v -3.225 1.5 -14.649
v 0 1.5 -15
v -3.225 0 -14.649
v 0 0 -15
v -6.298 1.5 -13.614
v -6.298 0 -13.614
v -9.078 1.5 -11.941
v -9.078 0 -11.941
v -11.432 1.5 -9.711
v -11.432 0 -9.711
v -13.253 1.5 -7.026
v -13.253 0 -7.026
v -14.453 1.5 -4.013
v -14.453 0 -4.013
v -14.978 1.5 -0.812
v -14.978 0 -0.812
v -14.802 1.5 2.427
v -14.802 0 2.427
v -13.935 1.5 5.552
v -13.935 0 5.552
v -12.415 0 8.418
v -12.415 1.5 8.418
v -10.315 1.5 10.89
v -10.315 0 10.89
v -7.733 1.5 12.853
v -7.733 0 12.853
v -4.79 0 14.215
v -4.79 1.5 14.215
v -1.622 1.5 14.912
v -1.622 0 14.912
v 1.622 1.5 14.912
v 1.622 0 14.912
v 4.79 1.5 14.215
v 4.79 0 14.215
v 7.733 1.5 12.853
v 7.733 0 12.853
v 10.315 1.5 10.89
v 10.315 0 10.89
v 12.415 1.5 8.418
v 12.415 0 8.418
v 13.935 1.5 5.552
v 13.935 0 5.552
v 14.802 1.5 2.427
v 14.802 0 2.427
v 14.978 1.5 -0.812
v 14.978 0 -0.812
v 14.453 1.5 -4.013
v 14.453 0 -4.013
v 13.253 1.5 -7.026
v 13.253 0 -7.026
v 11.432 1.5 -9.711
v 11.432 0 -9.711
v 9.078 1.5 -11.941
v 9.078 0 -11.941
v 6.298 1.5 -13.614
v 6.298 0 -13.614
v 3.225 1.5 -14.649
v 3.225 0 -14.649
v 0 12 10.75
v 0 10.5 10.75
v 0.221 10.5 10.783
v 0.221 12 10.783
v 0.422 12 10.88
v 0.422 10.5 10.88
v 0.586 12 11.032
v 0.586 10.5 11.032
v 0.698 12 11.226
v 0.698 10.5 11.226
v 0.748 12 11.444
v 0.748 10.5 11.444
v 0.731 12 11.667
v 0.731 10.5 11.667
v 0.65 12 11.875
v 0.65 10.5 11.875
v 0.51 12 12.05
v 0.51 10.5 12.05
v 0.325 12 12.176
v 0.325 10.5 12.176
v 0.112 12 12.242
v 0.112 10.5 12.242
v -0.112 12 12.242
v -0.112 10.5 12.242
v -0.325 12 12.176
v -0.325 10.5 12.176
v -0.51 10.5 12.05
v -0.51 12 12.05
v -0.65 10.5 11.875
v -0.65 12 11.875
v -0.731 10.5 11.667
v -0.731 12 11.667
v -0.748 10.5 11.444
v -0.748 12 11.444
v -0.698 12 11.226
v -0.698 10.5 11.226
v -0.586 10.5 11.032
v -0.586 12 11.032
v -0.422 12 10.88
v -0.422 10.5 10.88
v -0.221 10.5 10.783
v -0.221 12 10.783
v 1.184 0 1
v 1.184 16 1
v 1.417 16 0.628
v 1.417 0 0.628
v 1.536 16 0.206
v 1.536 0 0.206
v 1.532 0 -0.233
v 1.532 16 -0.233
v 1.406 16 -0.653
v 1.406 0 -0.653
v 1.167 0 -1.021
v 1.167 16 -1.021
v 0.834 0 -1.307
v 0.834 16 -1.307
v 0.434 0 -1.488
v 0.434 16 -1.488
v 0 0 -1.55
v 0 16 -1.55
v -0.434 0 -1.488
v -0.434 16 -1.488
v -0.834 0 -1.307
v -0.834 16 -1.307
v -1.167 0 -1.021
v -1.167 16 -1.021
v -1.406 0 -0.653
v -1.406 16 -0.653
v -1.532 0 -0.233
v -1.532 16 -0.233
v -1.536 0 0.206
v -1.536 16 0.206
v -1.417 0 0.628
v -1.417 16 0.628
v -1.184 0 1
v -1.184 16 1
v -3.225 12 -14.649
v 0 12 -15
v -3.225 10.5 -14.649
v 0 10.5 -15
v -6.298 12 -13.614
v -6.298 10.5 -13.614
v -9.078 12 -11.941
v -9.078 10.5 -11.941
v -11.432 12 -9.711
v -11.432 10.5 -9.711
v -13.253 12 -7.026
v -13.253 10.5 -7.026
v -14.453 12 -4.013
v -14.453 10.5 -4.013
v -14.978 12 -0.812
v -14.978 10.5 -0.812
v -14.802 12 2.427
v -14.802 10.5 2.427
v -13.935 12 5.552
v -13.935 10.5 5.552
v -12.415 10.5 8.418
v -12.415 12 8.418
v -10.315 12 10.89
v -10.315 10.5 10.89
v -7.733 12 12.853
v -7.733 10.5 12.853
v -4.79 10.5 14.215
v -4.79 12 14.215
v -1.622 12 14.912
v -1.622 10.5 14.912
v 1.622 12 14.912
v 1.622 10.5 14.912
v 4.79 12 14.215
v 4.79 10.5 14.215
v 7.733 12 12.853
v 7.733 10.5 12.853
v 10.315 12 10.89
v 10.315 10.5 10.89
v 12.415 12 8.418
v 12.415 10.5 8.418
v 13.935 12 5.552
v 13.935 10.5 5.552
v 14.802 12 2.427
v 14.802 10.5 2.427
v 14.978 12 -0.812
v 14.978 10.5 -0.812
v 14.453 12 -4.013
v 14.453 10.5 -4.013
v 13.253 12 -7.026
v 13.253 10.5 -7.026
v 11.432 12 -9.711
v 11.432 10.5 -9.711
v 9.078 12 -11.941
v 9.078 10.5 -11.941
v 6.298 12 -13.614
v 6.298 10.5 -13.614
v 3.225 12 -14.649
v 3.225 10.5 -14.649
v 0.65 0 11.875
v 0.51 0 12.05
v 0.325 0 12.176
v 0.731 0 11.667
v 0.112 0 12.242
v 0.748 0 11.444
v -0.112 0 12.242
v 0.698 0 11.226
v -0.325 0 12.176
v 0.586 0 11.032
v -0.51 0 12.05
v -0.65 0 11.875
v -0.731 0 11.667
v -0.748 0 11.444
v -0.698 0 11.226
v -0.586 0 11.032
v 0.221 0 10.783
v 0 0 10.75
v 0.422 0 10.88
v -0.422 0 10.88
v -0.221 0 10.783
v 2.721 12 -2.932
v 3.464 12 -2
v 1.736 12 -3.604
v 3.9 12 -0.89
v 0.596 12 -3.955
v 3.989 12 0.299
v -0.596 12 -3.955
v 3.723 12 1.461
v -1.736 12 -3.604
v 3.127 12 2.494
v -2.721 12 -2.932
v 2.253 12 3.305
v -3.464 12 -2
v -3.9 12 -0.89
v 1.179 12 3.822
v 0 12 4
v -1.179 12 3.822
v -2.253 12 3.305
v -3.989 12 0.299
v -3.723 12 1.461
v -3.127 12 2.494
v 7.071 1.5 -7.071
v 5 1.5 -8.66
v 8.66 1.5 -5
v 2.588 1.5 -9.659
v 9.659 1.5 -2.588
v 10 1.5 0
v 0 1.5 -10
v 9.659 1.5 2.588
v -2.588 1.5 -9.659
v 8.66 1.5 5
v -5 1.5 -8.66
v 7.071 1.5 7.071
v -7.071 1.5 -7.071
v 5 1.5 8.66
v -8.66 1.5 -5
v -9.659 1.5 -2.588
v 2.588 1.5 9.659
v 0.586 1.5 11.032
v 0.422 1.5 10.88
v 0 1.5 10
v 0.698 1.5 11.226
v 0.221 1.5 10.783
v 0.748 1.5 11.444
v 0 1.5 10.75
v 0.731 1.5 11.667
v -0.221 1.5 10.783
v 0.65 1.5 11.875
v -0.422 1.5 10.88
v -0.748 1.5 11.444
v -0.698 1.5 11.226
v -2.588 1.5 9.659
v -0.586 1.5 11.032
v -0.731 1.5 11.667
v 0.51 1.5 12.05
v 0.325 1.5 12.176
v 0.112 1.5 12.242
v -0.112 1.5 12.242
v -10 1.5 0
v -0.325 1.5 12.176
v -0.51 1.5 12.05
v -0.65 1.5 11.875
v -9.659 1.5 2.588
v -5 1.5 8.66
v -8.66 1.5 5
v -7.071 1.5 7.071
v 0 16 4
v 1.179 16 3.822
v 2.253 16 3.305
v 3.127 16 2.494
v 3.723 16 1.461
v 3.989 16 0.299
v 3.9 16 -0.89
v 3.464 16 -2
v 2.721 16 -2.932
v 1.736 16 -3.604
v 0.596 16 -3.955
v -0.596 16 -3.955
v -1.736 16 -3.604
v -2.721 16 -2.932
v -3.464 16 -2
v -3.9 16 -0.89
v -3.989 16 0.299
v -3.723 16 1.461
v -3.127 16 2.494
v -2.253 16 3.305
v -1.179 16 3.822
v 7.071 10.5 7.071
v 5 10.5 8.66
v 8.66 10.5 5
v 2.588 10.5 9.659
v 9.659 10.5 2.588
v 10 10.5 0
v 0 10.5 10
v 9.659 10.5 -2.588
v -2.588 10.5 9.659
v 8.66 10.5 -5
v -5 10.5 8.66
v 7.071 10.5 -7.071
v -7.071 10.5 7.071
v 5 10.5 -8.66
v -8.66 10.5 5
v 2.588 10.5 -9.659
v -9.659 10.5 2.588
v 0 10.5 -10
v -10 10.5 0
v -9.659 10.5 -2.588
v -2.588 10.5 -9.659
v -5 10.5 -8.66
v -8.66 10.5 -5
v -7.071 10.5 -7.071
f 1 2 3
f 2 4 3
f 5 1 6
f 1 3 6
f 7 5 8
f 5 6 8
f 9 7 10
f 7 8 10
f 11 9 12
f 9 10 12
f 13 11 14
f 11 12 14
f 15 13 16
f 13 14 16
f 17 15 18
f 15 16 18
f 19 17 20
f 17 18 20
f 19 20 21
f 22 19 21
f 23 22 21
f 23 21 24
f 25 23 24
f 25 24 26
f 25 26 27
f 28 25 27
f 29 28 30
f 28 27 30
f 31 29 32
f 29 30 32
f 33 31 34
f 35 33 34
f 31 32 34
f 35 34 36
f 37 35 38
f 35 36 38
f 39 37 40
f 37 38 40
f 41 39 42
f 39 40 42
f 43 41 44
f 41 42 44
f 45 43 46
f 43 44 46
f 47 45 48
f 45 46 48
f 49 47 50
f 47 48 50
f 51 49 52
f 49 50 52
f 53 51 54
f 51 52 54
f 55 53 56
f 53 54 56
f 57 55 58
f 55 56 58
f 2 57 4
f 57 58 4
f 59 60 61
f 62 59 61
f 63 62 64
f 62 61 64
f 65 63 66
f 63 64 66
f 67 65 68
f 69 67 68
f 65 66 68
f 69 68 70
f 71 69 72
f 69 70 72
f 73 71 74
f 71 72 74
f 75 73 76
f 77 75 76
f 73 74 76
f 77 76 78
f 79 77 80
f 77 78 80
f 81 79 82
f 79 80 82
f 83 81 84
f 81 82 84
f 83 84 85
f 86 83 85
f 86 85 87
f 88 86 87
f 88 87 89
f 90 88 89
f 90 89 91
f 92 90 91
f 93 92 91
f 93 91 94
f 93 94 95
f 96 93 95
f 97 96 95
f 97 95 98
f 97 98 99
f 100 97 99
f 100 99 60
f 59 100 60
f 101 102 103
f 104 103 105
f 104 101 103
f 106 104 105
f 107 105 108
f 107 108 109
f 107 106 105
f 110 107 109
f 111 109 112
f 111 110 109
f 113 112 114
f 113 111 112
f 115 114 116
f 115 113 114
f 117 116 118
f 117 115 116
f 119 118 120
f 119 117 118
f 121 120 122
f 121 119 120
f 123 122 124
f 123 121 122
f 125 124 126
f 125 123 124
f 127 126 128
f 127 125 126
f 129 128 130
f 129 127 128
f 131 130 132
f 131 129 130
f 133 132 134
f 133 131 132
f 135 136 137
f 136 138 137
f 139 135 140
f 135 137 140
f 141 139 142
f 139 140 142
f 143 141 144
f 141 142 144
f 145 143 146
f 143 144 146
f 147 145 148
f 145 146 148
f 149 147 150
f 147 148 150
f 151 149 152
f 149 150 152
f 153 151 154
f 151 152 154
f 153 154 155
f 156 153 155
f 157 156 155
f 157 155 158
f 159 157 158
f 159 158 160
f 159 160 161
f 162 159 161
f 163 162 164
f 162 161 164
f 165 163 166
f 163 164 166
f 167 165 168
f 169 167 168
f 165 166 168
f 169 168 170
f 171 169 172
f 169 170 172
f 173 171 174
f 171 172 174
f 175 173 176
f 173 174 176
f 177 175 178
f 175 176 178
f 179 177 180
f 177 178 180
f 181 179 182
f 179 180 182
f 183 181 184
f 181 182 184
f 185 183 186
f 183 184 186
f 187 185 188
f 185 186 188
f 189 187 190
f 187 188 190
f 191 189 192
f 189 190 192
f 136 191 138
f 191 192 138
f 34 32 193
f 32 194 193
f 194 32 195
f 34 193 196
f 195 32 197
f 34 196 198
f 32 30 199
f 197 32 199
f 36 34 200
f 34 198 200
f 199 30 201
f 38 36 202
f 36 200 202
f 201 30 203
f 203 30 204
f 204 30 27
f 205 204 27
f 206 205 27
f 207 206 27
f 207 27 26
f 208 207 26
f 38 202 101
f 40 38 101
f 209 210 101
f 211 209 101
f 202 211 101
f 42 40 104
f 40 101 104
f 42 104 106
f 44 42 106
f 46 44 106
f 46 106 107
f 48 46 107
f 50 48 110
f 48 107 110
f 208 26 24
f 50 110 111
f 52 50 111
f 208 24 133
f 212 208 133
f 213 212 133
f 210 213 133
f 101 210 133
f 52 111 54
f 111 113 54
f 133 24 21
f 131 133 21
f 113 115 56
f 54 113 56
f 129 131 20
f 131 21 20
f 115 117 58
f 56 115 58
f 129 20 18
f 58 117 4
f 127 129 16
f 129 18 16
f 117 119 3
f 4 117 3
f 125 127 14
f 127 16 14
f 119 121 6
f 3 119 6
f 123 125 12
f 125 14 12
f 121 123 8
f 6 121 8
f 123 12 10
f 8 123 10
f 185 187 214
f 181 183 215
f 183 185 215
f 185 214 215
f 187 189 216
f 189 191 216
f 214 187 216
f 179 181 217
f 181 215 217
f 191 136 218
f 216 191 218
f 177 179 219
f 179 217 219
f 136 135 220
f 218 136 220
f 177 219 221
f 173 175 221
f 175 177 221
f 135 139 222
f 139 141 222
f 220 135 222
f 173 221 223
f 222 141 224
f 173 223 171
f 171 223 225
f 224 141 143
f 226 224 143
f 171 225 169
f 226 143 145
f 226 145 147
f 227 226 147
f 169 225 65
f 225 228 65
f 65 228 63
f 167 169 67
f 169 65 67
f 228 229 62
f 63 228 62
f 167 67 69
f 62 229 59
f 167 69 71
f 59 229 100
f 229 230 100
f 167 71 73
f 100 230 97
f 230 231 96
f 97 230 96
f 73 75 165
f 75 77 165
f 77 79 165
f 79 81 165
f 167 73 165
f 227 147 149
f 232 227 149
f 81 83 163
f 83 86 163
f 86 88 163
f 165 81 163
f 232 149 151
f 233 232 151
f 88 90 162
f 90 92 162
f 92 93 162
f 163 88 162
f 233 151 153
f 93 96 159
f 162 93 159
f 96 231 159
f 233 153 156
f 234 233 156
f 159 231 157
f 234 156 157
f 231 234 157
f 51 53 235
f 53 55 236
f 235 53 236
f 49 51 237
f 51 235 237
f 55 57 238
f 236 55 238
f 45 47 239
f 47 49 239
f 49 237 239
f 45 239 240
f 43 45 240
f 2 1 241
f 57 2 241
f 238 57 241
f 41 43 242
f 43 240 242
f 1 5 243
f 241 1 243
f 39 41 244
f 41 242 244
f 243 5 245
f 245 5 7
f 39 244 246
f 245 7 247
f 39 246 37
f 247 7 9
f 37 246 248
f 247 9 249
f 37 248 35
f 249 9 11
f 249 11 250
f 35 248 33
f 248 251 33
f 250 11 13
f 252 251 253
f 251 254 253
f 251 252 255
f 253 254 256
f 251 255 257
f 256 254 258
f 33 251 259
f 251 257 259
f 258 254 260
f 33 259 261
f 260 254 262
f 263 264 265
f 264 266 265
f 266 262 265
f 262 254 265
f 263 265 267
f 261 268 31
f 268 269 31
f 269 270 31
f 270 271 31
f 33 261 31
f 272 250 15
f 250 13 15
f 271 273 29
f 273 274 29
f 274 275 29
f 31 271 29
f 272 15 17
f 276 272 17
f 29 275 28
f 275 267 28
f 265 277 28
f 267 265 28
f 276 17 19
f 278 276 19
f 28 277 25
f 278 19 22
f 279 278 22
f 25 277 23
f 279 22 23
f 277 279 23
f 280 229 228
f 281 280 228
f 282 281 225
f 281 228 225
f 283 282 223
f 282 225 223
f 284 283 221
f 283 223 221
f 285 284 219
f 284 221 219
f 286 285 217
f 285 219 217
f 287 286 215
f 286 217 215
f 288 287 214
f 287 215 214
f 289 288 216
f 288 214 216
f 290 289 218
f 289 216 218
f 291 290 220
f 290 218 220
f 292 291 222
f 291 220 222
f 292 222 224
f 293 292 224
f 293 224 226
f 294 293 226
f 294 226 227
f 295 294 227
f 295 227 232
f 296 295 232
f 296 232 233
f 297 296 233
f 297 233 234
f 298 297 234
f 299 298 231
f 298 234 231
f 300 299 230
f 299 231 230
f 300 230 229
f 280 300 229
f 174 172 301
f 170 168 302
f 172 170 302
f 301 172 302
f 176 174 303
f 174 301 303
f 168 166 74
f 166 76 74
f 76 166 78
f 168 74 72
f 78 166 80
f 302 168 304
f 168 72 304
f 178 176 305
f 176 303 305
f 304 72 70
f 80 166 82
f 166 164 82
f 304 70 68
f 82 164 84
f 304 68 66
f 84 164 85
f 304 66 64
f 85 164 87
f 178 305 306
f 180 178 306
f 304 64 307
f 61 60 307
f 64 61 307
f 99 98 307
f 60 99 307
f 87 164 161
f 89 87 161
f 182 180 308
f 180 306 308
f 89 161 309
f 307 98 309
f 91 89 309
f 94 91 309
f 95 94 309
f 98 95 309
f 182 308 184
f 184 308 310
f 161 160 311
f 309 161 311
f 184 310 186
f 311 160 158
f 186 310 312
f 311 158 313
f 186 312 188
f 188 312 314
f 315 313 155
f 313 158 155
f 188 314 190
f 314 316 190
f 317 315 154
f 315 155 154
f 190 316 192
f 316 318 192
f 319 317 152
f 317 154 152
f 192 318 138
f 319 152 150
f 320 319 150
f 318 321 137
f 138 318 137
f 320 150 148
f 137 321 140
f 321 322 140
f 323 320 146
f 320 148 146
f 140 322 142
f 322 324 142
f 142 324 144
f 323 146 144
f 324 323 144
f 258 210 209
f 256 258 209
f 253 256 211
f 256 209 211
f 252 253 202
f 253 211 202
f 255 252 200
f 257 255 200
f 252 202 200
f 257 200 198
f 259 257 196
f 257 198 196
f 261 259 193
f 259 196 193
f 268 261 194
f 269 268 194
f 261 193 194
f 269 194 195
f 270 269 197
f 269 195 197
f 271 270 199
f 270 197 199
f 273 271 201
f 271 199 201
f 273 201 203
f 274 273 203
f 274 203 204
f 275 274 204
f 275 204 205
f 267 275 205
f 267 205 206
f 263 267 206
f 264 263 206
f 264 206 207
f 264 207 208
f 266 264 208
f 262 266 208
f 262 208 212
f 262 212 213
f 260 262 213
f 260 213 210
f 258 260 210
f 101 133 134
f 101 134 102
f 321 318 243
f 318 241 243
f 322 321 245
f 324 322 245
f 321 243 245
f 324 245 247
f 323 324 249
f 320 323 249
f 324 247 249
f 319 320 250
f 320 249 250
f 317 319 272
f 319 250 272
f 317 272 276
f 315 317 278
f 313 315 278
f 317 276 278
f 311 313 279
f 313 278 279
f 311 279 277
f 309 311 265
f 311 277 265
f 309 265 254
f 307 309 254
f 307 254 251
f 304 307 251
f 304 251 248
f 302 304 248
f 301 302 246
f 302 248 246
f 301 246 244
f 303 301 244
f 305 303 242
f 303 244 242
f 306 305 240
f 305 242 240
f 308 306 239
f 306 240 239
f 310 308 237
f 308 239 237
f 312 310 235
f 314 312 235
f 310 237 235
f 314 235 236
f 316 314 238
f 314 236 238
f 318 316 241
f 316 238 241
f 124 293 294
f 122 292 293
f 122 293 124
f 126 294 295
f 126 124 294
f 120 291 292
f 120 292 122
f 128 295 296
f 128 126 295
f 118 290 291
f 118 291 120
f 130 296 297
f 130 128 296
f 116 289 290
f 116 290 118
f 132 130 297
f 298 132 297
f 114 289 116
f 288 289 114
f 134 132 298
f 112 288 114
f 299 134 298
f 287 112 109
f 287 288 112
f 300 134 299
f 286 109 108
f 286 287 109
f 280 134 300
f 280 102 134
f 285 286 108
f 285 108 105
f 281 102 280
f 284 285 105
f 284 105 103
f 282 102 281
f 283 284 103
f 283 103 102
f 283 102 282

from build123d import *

# Parameters (mm, degrees)
SKETCH2_R           = 4
BOSS_EXTRUDE1_DEPTH = 4
CUT_EXTRUDE1_DEPTH  = 16
SKETCH4_R           = 0.75
CUT_EXTRUDE2_DEPTH  = 16


with BuildPart() as part:
    # Sketch1 → Revolve1 (revolve)
    with BuildSketch(Plane.XY, mode=Mode.PRIVATE) as revolve1_sk:
        Polygon((0, 0), (0, 12), (15, 12), (15, 10.5), (10, 10.5), (10, 1.5), (15, 1.5), (15, 0), align=None)
    revolve(revolve1_sk.sketch.rotate(Axis((0, 0, 0), (0, 1, 0)), 90), axis=Axis((0, 0, 0), (0, 1, 0)))

    # Sketch2 → Boss-Extrude1 (add)
    with BuildSketch(Plane(origin=(0, 12, 0), x_dir=(1, 0, 0), z_dir=(0, 1, 0))):
        with Locations(Location((0, 0, 0), (0, 0, 270))):
            Circle(SKETCH2_R)
    extrude(amount=BOSS_EXTRUDE1_DEPTH)

    # Sketch3 → Cut-Extrude1 (cut)
    with BuildSketch(Plane.XZ):
        with BuildLine():
            Line((-1.184271928, 1), (1.184271928, 1))
            ThreePointArc((1.184271928, 1), (0, -1.55), (-1.184271928, 1))
        make_face()
    extrude(amount=-CUT_EXTRUDE1_DEPTH, mode=Mode.SUBTRACT)

    # Sketch4 → Cut-Extrude2 (cut)
    with BuildSketch(Plane.XZ):
        with Locations(Location((0, 11.5, 0), (0, 0, 270))):
            Circle(SKETCH4_R)
    extrude(amount=-CUT_EXTRUDE2_DEPTH, mode=Mode.SUBTRACT)


solid = part.part
